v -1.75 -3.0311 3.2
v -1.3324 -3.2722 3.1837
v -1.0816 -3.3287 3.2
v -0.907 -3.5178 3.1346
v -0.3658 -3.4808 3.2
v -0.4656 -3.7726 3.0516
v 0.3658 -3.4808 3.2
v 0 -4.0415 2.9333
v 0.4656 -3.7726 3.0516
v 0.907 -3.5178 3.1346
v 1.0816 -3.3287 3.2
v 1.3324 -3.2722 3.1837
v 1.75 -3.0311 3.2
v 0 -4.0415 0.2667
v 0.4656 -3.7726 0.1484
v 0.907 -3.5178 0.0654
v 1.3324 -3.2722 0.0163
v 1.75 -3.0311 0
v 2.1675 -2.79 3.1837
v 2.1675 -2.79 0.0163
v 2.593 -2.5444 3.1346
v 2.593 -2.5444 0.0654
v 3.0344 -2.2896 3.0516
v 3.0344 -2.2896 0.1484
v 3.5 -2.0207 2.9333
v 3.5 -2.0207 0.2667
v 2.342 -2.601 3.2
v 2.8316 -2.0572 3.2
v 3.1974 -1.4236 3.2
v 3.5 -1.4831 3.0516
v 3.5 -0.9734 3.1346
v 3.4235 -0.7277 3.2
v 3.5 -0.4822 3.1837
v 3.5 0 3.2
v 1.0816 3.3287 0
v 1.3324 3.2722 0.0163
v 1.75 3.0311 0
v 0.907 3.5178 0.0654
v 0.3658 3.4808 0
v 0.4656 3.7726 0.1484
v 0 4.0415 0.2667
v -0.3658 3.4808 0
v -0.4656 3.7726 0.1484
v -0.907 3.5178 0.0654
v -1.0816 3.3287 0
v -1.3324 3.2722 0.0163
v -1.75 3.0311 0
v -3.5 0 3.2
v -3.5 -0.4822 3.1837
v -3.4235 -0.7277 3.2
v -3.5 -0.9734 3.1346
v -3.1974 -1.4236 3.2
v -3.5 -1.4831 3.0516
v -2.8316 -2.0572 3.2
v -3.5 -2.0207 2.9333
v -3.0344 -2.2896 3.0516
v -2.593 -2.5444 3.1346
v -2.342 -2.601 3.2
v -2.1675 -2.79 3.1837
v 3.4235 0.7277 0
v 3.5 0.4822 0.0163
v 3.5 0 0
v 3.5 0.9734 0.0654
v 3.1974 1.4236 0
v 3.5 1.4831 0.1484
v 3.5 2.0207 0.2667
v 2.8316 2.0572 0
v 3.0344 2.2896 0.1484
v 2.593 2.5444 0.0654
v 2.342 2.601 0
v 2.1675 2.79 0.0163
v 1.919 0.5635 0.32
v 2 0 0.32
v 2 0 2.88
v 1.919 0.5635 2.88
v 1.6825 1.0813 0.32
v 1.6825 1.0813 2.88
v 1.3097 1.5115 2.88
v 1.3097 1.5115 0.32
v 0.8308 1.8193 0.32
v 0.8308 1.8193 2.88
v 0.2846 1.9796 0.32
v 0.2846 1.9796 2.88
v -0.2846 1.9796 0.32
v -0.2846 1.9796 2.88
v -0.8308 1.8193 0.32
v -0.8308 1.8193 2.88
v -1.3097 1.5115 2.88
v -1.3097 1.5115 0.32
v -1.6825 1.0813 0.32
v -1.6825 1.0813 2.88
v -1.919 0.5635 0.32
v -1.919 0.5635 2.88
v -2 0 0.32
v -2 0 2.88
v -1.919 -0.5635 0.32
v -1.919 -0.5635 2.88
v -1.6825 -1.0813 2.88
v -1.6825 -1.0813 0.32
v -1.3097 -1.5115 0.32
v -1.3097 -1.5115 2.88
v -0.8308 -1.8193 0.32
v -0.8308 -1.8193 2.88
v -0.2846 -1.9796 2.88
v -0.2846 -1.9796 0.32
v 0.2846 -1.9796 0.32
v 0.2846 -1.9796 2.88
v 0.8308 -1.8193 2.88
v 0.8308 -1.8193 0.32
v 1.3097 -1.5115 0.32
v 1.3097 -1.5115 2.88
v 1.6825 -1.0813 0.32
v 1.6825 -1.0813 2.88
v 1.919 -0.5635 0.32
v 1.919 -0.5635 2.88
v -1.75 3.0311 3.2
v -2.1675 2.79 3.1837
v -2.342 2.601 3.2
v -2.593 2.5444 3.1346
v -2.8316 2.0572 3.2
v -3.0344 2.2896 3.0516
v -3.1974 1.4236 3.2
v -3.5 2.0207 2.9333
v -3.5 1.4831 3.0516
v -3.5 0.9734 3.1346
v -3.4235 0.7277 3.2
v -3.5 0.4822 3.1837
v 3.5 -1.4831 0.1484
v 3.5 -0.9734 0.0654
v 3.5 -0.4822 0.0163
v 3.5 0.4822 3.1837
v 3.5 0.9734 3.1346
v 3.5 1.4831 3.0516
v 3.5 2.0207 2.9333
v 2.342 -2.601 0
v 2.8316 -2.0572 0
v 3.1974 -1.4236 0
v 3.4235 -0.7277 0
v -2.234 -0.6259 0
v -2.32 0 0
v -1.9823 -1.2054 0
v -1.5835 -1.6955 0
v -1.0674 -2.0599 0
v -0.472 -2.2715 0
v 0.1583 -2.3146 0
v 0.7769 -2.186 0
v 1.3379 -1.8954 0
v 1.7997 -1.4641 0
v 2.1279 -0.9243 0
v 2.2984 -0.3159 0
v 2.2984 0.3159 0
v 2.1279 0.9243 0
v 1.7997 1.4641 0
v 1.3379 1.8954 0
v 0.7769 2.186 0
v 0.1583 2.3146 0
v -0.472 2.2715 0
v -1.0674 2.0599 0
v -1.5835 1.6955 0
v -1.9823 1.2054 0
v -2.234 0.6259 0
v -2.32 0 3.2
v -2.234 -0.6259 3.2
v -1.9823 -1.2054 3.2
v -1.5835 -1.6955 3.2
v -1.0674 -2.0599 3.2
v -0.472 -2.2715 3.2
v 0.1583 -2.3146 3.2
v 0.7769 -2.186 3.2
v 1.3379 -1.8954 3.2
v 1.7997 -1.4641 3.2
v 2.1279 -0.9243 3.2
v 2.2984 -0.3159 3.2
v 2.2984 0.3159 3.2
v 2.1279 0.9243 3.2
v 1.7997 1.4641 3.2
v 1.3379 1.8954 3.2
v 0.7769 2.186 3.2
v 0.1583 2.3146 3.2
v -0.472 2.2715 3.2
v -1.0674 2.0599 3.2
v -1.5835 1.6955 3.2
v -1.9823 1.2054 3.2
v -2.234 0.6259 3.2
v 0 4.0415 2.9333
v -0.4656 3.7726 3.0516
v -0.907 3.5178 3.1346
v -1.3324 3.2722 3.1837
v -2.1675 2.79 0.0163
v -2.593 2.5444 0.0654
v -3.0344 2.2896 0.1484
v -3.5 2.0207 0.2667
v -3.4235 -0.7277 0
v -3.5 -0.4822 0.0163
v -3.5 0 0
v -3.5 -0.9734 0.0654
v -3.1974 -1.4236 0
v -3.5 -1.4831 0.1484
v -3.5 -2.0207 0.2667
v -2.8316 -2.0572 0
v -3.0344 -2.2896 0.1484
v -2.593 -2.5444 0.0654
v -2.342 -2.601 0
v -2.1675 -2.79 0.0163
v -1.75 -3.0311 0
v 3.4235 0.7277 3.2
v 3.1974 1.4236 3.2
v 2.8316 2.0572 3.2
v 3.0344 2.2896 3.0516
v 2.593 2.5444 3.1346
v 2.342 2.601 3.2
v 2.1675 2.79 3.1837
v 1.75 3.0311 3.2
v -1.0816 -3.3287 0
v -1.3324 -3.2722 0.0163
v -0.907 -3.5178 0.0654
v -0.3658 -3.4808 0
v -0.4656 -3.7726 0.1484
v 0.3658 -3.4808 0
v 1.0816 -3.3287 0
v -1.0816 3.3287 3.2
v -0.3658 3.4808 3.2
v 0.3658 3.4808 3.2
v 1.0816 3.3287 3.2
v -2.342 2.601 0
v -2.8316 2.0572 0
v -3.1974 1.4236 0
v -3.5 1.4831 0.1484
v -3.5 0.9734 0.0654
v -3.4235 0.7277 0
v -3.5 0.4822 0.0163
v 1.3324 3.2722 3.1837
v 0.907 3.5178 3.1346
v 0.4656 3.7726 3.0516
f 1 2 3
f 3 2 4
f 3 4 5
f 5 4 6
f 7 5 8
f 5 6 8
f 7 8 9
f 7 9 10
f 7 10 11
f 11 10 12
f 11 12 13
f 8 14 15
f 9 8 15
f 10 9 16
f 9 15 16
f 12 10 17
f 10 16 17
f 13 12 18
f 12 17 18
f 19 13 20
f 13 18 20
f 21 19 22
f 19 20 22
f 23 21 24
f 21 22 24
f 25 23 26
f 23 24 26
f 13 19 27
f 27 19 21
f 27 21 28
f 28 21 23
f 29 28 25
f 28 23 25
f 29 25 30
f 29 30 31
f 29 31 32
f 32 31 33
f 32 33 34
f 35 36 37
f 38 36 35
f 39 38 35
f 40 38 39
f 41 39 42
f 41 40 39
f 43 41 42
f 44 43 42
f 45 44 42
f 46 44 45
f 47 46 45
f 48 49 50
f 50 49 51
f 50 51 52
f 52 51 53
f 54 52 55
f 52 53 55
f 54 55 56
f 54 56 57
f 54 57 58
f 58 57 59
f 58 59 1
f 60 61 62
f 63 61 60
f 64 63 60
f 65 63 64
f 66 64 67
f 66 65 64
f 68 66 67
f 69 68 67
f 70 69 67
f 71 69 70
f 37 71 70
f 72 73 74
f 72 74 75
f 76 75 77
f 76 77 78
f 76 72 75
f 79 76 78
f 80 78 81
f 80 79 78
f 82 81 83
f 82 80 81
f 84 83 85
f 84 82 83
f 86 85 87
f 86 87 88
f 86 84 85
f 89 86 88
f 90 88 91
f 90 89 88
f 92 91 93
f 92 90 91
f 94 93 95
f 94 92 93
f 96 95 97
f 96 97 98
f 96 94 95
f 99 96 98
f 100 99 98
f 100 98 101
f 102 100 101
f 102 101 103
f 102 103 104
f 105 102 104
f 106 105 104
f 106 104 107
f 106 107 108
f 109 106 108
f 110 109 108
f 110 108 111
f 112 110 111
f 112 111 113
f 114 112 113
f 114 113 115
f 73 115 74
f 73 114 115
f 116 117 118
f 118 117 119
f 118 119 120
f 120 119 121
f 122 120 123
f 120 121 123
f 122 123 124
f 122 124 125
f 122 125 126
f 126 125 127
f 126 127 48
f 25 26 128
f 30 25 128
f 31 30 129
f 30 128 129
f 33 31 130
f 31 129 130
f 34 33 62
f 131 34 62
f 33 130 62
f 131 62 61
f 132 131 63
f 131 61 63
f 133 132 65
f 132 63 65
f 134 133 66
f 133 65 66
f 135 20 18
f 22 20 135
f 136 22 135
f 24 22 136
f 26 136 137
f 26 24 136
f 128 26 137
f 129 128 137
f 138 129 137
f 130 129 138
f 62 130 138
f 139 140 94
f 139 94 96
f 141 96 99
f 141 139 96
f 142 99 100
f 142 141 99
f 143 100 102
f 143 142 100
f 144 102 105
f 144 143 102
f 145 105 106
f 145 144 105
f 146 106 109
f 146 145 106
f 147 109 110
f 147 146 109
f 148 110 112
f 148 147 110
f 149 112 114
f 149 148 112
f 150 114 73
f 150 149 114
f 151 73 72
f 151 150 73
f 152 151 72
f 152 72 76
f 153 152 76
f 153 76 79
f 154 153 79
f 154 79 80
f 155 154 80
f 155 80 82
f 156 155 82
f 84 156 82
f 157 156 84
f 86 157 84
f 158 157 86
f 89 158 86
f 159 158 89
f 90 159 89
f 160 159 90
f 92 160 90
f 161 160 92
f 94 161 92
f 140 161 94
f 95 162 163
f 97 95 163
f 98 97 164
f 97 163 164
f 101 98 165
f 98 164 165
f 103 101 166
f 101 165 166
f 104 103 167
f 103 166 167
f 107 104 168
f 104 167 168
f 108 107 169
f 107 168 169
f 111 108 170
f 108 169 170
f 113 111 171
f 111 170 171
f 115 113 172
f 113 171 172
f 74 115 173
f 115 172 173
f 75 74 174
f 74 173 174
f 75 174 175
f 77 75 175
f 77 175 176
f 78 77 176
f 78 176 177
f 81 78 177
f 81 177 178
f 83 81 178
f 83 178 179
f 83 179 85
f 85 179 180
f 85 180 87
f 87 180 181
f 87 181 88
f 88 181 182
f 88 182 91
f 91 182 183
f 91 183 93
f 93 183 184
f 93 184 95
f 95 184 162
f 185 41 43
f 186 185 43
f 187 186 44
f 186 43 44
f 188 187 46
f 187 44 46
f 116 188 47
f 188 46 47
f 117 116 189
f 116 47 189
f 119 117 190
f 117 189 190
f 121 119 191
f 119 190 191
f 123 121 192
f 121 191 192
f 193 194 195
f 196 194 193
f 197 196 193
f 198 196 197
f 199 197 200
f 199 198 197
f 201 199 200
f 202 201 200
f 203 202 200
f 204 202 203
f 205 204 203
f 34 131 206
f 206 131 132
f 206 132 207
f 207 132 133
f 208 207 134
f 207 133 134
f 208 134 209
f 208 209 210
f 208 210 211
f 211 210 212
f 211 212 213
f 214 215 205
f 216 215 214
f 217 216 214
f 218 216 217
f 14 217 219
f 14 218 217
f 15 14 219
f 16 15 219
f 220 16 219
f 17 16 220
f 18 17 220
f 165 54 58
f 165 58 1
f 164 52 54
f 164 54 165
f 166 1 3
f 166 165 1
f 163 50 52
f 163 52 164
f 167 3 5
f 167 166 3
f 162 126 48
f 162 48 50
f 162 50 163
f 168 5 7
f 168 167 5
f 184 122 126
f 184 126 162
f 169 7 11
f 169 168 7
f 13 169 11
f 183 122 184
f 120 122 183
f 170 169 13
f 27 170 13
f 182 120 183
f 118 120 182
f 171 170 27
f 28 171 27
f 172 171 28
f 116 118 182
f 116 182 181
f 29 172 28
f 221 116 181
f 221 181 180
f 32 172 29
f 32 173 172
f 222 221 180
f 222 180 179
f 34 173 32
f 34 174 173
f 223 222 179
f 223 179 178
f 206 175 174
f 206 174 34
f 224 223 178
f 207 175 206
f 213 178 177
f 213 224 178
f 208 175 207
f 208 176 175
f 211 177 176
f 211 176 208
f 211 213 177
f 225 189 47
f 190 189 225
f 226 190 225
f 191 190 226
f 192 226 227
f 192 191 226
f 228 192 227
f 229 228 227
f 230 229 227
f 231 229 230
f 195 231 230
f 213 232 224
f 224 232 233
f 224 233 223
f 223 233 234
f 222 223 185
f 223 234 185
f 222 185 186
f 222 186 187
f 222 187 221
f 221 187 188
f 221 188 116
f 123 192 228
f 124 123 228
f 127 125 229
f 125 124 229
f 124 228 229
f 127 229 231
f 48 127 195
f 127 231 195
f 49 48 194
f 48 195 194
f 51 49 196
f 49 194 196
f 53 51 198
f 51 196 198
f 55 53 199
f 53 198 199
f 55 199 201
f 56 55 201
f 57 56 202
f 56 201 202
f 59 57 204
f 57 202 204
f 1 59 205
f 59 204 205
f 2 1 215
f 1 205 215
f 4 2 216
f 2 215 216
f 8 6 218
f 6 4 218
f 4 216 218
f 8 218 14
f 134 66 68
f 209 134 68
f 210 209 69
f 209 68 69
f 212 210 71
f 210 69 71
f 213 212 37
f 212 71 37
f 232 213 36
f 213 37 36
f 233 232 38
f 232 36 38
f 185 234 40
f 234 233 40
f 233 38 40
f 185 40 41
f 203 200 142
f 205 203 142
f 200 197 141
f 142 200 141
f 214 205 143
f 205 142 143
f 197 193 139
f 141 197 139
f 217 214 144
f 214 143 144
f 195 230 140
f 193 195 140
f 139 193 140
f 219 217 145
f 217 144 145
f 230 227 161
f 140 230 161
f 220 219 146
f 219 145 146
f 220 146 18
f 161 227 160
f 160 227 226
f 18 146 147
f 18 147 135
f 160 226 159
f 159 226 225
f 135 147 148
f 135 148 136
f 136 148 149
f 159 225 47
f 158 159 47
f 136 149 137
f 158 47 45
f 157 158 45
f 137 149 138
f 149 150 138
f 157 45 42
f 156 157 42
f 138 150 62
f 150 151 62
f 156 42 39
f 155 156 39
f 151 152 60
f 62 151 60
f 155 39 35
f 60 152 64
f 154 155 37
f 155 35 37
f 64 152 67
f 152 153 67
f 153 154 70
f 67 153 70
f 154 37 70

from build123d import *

# Parameters (mm, degrees)
SKETCH1_R           = 2
BOSS_EXTRUDE1_DEPTH = 3.2


with BuildPart() as part:
    # Sketch1 → Boss-Extrude1 (new body)
    with BuildSketch(Plane.XY):
        Polygon((0, -4.041451884), (3.5, -2.020725942), (3.5, 2.020725942), (0, 4.041451884), (-3.5, 2.020725942), (-3.5, -2.020725942), align=None)
        Circle(SKETCH1_R, mode=Mode.SUBTRACT)
    extrude(amount=BOSS_EXTRUDE1_DEPTH)

    # Sketch2 → Cut-Revolve1 (revolve, cut)
    with BuildSketch(Plane(origin=(0, 0, 0), x_dir=(0, 0, -1), z_dir=(1, 0, 0)), mode=Mode.PRIVATE) as cut_revolve1_sk:
        Polygon((-3.2, 4.041451884), (-3.2, 3.5), (-2.933333333, 4.041451884), align=None)
        Polygon((-0.266666667, 4.041451884), (0, 4.041451884), (0, 3.5), align=None)
        Polygon((-3.2, 2), (-2.88, 2), (-3.2, 2.32), align=None)
        Polygon((0, 2), (-0.32, 2), (0, 2.32), align=None)
    revolve(cut_revolve1_sk.sketch.rotate(Axis((0, 0, 0), (0, 0, 1)), 90), axis=Axis((0, 0, 0), (0, 0, 1)), mode=Mode.SUBTRACT)


solid = part.part
